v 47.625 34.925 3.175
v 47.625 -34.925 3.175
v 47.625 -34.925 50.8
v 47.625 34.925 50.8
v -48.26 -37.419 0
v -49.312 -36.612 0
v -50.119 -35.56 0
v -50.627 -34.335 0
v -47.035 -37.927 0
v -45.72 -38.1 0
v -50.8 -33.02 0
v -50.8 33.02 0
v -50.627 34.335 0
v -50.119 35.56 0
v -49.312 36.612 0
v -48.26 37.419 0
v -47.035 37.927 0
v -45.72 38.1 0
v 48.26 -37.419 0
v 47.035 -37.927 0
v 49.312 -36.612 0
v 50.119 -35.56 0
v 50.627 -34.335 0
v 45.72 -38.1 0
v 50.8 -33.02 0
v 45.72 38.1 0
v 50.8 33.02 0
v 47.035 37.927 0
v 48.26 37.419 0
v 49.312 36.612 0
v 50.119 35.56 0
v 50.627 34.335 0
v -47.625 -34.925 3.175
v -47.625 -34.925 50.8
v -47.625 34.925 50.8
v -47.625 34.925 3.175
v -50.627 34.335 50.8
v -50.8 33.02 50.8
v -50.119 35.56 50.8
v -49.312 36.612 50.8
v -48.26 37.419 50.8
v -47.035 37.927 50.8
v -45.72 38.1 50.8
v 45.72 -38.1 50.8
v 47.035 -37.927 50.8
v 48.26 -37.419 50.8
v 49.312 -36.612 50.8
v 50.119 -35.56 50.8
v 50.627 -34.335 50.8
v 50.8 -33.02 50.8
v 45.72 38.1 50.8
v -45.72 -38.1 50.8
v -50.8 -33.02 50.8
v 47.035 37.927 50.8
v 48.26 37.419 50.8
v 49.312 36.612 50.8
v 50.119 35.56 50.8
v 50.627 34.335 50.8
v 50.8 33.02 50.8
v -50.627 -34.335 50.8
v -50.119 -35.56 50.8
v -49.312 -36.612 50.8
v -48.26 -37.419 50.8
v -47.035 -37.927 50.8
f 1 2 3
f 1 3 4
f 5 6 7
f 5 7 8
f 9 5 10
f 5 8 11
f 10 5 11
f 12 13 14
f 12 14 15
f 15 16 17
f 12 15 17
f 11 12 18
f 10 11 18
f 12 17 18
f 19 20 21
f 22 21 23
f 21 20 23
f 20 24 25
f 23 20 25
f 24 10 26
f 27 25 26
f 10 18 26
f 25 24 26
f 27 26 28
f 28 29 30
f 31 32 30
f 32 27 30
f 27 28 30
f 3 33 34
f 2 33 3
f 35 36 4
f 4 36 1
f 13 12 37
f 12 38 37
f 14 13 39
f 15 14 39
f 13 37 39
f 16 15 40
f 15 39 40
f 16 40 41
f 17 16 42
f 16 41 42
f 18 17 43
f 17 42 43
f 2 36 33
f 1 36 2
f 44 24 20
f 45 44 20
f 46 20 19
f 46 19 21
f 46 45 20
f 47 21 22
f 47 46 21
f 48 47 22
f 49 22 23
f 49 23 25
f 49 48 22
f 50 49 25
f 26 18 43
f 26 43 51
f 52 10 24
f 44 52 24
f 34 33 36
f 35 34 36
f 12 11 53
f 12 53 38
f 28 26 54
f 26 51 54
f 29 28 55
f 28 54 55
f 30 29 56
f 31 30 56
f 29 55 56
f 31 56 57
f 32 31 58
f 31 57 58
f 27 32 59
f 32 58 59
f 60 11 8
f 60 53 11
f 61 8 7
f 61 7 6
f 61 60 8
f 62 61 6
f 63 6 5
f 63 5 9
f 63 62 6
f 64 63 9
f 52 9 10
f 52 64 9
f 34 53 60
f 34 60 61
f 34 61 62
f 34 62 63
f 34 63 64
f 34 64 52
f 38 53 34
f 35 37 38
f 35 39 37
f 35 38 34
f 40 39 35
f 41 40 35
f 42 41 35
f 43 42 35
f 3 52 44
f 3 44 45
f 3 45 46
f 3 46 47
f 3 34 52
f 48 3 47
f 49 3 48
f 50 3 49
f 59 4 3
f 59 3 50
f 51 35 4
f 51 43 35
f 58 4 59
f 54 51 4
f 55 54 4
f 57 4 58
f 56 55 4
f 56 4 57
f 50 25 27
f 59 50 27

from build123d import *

# Parameters (mm, degrees)
F0_W     = 101.6
F0_H     = 76.2
F0_W_2   = 95.25
F0_H_2   = 69.85
F1_DEPTH = 50.8
F2_DEPTH = 3.175
F3_R     = 5.08


with BuildPart() as f1:
    # F0 (on Top) → F1 (new body)
    with BuildSketch(Plane.XY):
        Rectangle(F0_W, F0_H)
        Rectangle(F0_W_2, F0_H_2, mode=Mode.SUBTRACT)
    extrude(amount=F1_DEPTH)

    # F0 (on Top) → F2 (join)
    with BuildSketch(Plane.XY):
        Rectangle(F0_W_2, F0_H_2)
    extrude(amount=F2_DEPTH)

    # F3
    f3_edges = [f1.edges().sort_by_distance(p)[0] for p in [
        (50.8, 38.1, 25.4),
        (50.8, -38.1, 25.4),
        (-50.8, 38.1, 25.4),
        (-50.8, -38.1, 25.4),
    ]]
    fillet(f3_edges, radius=F3_R)


solid = f1.part
